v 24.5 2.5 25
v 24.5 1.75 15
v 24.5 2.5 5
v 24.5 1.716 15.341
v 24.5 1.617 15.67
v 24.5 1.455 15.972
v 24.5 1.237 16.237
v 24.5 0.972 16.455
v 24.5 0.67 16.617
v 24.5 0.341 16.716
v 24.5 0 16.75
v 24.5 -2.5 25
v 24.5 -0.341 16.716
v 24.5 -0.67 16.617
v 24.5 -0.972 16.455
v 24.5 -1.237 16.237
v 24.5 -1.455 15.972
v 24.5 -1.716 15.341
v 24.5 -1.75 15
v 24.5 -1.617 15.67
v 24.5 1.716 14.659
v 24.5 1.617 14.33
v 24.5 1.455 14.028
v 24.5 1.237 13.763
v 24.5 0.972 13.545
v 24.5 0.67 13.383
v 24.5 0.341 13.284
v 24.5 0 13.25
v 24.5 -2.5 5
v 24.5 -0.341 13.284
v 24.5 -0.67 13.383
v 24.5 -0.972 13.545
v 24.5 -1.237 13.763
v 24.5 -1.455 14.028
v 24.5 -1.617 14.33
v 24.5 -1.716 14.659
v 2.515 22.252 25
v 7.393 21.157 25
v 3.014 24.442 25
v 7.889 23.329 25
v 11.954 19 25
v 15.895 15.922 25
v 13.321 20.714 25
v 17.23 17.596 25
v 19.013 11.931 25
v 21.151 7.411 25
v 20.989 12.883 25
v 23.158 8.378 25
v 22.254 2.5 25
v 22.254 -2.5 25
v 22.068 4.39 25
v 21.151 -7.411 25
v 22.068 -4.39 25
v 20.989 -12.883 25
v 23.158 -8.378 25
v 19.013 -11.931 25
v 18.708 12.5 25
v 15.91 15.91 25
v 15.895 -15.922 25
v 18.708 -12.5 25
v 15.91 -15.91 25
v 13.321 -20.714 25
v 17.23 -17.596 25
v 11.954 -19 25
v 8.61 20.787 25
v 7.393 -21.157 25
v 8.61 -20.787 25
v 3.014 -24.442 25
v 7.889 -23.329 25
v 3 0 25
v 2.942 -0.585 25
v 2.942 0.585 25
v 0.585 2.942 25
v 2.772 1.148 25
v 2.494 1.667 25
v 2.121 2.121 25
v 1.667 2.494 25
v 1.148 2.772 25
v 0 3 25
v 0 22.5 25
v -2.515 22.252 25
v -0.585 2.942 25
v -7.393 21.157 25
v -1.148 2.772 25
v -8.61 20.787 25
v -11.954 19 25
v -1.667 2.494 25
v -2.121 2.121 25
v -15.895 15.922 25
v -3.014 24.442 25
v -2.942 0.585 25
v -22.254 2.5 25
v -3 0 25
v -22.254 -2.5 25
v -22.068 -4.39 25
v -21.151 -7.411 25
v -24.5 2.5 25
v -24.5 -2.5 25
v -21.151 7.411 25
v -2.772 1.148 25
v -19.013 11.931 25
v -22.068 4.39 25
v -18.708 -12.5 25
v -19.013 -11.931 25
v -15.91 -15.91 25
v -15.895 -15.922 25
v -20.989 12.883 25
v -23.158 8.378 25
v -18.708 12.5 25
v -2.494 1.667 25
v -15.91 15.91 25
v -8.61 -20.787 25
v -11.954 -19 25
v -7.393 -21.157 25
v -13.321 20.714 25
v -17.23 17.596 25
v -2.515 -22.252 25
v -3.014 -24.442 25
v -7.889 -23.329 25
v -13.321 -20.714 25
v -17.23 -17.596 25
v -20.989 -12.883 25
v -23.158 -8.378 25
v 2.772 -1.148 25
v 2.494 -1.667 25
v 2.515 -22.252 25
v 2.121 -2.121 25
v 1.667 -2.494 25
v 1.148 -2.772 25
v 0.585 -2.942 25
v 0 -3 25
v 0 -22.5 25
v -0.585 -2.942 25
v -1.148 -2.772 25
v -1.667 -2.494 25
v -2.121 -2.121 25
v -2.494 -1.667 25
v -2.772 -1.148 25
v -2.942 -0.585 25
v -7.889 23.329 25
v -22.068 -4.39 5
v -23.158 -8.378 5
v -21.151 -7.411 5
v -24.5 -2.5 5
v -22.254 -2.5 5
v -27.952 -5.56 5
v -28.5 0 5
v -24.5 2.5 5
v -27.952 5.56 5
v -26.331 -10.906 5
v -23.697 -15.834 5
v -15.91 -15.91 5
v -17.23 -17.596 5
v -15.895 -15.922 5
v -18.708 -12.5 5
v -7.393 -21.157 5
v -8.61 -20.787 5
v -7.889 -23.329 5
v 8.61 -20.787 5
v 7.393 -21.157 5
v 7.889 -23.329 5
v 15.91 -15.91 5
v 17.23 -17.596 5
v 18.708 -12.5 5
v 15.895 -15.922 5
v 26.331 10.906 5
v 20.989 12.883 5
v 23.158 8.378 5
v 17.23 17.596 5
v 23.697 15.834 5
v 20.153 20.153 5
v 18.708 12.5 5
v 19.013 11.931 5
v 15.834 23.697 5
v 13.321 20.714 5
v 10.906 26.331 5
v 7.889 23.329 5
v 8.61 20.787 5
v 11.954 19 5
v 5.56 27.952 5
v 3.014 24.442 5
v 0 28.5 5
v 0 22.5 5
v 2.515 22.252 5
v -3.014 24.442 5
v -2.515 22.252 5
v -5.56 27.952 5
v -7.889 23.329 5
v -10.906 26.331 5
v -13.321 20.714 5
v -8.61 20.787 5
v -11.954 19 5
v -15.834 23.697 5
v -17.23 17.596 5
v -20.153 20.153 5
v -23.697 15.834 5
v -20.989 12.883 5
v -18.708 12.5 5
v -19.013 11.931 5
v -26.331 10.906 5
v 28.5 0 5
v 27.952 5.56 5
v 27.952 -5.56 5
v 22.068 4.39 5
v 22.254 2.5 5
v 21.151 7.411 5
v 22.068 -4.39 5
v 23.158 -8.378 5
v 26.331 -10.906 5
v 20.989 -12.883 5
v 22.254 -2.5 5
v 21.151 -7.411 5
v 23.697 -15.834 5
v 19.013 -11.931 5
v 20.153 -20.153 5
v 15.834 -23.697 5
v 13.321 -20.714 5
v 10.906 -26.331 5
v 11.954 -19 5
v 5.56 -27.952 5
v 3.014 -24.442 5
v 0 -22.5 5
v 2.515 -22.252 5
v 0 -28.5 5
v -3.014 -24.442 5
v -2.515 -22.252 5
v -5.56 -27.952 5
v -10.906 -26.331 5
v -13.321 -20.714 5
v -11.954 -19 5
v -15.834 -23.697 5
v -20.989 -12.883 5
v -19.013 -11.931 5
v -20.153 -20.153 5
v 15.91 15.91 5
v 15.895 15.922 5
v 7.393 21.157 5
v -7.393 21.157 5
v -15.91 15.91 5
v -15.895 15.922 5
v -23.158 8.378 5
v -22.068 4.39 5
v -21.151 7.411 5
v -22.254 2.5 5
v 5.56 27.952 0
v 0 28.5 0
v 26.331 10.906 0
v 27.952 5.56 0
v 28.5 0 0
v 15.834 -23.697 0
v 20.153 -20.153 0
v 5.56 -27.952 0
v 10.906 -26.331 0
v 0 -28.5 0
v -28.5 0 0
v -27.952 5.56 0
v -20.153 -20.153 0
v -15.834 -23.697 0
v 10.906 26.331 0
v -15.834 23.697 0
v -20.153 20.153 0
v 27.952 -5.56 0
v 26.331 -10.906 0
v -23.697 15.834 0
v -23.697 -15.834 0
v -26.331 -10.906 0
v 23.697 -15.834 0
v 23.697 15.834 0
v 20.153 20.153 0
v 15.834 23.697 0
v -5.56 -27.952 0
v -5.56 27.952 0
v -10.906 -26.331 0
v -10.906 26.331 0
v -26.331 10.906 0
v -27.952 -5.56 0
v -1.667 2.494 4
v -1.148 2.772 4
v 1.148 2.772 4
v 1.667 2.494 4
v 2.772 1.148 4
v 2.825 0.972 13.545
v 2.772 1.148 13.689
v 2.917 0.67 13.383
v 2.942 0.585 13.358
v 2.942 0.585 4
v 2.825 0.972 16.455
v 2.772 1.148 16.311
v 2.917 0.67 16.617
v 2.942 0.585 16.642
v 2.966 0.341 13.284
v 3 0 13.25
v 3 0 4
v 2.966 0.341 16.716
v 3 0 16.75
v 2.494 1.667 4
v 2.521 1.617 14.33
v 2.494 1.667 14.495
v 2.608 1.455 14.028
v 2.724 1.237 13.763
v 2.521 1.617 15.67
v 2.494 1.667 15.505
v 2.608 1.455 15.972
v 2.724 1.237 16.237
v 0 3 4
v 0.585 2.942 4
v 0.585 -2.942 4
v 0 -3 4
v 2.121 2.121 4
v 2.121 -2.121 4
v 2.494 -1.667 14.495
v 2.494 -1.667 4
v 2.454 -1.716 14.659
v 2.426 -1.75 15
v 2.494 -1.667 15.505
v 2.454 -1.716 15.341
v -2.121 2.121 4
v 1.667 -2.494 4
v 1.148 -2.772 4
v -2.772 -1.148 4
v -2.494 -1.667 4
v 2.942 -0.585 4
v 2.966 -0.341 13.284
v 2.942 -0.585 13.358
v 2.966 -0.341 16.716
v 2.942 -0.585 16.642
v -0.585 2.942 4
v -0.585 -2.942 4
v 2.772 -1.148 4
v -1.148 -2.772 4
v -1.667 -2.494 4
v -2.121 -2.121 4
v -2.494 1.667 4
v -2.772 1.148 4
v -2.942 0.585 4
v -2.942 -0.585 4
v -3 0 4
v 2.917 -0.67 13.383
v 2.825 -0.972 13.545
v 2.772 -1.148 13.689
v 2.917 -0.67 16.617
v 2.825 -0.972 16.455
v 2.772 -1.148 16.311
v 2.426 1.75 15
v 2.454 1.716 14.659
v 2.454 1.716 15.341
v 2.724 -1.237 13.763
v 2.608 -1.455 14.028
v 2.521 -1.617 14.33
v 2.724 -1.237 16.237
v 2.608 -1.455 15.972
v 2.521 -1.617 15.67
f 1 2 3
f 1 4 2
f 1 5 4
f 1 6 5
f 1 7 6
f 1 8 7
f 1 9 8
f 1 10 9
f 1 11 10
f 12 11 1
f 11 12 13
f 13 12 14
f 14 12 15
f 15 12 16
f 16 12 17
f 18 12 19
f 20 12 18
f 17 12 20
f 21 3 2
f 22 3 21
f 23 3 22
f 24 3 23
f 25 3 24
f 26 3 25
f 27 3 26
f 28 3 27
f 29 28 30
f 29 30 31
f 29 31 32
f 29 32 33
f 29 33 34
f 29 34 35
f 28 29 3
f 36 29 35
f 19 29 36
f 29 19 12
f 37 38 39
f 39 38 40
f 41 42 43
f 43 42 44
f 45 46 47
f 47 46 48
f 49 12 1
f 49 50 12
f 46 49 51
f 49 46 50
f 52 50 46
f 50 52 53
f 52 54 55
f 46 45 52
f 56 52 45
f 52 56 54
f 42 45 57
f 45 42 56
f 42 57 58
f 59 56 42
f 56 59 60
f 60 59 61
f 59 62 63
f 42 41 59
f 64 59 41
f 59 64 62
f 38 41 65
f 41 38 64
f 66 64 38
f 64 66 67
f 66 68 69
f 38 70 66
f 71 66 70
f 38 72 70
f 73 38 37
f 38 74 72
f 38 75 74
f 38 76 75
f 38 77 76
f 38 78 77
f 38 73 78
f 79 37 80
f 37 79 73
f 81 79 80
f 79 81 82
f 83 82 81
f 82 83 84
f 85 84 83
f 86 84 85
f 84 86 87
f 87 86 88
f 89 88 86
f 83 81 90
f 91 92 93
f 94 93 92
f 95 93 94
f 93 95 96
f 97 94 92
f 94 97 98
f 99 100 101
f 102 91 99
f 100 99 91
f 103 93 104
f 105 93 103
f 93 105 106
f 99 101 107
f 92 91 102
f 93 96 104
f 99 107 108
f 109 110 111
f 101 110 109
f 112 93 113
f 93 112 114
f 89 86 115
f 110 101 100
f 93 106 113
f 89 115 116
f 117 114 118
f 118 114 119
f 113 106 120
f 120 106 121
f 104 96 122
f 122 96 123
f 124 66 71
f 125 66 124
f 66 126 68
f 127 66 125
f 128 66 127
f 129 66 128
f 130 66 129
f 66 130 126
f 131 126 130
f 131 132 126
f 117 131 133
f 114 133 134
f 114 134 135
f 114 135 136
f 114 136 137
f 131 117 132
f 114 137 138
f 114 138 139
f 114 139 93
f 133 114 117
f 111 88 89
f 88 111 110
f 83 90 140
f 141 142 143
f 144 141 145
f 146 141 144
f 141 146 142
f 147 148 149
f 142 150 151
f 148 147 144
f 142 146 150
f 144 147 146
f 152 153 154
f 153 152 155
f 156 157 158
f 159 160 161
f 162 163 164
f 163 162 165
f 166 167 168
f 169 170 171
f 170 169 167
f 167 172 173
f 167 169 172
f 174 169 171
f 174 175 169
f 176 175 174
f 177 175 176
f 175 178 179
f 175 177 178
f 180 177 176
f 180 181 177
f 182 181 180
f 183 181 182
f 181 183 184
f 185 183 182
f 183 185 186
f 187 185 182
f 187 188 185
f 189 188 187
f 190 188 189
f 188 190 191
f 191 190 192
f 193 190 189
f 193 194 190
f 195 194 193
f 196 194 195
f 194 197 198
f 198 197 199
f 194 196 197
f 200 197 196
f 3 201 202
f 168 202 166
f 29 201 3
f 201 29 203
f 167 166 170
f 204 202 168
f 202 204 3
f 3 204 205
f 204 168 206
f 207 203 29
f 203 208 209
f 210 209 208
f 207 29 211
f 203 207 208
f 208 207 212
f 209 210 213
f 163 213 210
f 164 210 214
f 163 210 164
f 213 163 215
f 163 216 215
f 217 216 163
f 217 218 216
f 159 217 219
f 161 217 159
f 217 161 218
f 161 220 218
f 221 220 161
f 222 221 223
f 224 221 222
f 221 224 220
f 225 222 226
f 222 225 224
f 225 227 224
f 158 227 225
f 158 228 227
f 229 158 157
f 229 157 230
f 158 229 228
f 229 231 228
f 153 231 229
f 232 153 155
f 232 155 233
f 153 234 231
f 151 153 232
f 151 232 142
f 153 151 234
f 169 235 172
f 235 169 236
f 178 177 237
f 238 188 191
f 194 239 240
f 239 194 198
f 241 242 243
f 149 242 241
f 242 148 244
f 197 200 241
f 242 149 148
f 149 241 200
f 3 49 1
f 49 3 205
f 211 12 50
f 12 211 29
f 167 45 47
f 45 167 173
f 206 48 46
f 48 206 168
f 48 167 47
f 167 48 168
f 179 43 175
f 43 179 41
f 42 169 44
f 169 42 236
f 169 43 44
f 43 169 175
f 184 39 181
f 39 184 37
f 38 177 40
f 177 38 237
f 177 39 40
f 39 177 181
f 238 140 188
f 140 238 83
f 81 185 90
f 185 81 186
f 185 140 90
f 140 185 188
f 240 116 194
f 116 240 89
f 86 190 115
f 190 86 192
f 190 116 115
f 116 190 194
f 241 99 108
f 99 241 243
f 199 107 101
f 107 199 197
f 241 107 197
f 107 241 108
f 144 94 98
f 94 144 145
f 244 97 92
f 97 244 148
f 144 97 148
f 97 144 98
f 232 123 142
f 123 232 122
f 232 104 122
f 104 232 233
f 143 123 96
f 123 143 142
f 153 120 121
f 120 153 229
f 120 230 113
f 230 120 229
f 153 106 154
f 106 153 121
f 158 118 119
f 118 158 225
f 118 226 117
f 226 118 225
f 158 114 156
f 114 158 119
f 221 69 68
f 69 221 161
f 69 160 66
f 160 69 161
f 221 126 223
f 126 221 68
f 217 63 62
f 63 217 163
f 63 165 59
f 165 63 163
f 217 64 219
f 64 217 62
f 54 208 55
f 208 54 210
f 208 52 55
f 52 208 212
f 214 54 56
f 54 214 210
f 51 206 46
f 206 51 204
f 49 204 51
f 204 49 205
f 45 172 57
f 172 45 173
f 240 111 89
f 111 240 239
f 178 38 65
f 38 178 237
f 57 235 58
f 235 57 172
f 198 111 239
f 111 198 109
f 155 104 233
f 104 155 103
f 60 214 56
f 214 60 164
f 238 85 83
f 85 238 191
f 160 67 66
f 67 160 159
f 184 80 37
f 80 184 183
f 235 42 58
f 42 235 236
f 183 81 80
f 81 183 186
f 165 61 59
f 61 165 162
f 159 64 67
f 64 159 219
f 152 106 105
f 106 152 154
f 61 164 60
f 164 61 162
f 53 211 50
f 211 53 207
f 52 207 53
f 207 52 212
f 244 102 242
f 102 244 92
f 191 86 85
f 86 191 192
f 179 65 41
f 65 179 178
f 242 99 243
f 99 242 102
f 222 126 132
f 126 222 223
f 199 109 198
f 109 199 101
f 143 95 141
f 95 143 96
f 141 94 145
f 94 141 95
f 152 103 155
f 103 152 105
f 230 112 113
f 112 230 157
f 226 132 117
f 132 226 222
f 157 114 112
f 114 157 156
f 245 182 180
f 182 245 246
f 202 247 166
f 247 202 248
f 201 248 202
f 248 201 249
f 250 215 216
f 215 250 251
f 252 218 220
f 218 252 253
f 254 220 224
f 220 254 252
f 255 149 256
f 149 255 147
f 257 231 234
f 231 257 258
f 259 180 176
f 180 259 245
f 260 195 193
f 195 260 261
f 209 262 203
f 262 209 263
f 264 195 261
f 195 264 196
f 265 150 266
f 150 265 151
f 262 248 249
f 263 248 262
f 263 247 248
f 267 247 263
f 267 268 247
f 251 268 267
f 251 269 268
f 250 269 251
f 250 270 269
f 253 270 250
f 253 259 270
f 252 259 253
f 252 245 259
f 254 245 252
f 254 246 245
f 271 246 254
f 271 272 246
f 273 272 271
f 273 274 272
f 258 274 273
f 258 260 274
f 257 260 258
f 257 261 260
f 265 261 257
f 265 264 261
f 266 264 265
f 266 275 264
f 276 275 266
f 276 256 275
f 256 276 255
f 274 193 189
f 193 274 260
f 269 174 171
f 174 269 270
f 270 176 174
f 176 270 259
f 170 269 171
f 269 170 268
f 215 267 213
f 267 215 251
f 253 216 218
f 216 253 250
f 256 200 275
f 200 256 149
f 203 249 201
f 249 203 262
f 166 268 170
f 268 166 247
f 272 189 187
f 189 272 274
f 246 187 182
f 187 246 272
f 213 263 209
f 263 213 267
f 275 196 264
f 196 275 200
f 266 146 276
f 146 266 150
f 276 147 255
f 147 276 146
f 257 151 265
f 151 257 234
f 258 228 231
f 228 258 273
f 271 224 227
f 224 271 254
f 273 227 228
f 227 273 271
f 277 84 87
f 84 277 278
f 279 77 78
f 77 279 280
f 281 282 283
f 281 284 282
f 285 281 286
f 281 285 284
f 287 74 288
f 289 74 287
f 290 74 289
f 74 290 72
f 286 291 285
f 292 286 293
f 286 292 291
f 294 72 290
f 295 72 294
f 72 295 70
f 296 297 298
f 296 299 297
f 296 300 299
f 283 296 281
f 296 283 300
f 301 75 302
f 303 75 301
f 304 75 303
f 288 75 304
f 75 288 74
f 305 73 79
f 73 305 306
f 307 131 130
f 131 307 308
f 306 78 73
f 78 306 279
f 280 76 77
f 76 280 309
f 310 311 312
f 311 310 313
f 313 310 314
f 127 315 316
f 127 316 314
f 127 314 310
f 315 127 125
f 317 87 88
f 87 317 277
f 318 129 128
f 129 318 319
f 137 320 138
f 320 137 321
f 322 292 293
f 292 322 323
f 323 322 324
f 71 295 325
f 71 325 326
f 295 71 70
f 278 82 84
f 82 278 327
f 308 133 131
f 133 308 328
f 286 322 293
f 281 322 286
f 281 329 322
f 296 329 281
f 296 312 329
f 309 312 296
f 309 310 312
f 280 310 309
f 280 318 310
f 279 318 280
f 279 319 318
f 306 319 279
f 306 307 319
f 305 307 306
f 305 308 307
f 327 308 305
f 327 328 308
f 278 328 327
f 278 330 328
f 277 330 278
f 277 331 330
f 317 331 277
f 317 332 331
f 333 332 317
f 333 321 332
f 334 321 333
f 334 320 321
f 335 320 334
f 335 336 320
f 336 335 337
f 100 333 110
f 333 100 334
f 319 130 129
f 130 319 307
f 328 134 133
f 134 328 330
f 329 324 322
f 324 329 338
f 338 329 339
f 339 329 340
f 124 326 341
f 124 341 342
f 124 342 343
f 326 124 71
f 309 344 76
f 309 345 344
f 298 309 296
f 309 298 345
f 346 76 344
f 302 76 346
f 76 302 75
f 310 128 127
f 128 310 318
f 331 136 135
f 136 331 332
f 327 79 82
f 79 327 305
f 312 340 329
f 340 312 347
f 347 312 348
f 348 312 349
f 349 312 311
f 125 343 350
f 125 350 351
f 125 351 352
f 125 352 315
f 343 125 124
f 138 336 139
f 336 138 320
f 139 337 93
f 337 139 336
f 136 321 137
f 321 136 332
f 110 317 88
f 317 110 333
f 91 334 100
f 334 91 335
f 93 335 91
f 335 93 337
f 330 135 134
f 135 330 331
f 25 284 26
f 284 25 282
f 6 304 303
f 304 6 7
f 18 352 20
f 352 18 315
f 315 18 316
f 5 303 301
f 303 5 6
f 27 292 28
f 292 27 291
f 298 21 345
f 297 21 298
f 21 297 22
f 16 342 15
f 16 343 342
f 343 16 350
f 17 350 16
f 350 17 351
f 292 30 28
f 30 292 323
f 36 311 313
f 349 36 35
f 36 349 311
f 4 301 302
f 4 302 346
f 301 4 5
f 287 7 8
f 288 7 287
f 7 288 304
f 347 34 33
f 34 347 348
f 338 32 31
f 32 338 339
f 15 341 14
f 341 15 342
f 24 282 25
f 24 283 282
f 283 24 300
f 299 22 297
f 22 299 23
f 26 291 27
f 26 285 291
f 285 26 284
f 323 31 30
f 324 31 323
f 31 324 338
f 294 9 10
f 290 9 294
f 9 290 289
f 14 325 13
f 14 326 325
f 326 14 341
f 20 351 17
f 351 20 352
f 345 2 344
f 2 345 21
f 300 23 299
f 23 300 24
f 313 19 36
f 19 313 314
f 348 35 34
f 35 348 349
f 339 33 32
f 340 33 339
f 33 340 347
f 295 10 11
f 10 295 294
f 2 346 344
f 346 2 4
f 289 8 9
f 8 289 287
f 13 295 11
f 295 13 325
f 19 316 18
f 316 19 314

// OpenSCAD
$fn = 32;

// ----------------------------------------------------------------------
// Control knob: skirt knob with grip ribs
// ----------------------------------------------------------------------

// --- parameters (mm) ---
skirt_d = 57;             // skirt diameter
skirt_t = 5;              // skirt thickness
rib_w = 5;                // grip rib width
rib_out = 3;              // grip rib radial protrusion
n_ribs = 14;              // number of grip ribs
knob_d = 45;              // knob body diameter
knob_h = 20;              // knob body height
bore_d = 6;               // shaft bore diameter
set_d = 3.5;              // set screw bore diameter

rib_step = 360 / n_ribs;  // rib angular step
total_h = skirt_t + knob_h;  // overall height

difference() {
  union() {
    translate([0, 0, skirt_t]) cylinder(h = knob_h, d = knob_d);
    cylinder(h = skirt_t, d = skirt_d);
    for (i = [0 : n_ribs - 1])
      rotate([0, 0, i * rib_step])
        translate([knob_d / 2 - 1, -rib_w / 2, skirt_t])
          cube([rib_out, rib_w, knob_h]);
  }
  translate([0, 0, skirt_t - 1]) cylinder(h = knob_h + 2, d = bore_d);
  translate([-1, 0, skirt_t + knob_h / 2]) rotate([0, 90, 0])
    cylinder(h = knob_d / 2 + bore_d / 2 + 2, d = set_d);
}
